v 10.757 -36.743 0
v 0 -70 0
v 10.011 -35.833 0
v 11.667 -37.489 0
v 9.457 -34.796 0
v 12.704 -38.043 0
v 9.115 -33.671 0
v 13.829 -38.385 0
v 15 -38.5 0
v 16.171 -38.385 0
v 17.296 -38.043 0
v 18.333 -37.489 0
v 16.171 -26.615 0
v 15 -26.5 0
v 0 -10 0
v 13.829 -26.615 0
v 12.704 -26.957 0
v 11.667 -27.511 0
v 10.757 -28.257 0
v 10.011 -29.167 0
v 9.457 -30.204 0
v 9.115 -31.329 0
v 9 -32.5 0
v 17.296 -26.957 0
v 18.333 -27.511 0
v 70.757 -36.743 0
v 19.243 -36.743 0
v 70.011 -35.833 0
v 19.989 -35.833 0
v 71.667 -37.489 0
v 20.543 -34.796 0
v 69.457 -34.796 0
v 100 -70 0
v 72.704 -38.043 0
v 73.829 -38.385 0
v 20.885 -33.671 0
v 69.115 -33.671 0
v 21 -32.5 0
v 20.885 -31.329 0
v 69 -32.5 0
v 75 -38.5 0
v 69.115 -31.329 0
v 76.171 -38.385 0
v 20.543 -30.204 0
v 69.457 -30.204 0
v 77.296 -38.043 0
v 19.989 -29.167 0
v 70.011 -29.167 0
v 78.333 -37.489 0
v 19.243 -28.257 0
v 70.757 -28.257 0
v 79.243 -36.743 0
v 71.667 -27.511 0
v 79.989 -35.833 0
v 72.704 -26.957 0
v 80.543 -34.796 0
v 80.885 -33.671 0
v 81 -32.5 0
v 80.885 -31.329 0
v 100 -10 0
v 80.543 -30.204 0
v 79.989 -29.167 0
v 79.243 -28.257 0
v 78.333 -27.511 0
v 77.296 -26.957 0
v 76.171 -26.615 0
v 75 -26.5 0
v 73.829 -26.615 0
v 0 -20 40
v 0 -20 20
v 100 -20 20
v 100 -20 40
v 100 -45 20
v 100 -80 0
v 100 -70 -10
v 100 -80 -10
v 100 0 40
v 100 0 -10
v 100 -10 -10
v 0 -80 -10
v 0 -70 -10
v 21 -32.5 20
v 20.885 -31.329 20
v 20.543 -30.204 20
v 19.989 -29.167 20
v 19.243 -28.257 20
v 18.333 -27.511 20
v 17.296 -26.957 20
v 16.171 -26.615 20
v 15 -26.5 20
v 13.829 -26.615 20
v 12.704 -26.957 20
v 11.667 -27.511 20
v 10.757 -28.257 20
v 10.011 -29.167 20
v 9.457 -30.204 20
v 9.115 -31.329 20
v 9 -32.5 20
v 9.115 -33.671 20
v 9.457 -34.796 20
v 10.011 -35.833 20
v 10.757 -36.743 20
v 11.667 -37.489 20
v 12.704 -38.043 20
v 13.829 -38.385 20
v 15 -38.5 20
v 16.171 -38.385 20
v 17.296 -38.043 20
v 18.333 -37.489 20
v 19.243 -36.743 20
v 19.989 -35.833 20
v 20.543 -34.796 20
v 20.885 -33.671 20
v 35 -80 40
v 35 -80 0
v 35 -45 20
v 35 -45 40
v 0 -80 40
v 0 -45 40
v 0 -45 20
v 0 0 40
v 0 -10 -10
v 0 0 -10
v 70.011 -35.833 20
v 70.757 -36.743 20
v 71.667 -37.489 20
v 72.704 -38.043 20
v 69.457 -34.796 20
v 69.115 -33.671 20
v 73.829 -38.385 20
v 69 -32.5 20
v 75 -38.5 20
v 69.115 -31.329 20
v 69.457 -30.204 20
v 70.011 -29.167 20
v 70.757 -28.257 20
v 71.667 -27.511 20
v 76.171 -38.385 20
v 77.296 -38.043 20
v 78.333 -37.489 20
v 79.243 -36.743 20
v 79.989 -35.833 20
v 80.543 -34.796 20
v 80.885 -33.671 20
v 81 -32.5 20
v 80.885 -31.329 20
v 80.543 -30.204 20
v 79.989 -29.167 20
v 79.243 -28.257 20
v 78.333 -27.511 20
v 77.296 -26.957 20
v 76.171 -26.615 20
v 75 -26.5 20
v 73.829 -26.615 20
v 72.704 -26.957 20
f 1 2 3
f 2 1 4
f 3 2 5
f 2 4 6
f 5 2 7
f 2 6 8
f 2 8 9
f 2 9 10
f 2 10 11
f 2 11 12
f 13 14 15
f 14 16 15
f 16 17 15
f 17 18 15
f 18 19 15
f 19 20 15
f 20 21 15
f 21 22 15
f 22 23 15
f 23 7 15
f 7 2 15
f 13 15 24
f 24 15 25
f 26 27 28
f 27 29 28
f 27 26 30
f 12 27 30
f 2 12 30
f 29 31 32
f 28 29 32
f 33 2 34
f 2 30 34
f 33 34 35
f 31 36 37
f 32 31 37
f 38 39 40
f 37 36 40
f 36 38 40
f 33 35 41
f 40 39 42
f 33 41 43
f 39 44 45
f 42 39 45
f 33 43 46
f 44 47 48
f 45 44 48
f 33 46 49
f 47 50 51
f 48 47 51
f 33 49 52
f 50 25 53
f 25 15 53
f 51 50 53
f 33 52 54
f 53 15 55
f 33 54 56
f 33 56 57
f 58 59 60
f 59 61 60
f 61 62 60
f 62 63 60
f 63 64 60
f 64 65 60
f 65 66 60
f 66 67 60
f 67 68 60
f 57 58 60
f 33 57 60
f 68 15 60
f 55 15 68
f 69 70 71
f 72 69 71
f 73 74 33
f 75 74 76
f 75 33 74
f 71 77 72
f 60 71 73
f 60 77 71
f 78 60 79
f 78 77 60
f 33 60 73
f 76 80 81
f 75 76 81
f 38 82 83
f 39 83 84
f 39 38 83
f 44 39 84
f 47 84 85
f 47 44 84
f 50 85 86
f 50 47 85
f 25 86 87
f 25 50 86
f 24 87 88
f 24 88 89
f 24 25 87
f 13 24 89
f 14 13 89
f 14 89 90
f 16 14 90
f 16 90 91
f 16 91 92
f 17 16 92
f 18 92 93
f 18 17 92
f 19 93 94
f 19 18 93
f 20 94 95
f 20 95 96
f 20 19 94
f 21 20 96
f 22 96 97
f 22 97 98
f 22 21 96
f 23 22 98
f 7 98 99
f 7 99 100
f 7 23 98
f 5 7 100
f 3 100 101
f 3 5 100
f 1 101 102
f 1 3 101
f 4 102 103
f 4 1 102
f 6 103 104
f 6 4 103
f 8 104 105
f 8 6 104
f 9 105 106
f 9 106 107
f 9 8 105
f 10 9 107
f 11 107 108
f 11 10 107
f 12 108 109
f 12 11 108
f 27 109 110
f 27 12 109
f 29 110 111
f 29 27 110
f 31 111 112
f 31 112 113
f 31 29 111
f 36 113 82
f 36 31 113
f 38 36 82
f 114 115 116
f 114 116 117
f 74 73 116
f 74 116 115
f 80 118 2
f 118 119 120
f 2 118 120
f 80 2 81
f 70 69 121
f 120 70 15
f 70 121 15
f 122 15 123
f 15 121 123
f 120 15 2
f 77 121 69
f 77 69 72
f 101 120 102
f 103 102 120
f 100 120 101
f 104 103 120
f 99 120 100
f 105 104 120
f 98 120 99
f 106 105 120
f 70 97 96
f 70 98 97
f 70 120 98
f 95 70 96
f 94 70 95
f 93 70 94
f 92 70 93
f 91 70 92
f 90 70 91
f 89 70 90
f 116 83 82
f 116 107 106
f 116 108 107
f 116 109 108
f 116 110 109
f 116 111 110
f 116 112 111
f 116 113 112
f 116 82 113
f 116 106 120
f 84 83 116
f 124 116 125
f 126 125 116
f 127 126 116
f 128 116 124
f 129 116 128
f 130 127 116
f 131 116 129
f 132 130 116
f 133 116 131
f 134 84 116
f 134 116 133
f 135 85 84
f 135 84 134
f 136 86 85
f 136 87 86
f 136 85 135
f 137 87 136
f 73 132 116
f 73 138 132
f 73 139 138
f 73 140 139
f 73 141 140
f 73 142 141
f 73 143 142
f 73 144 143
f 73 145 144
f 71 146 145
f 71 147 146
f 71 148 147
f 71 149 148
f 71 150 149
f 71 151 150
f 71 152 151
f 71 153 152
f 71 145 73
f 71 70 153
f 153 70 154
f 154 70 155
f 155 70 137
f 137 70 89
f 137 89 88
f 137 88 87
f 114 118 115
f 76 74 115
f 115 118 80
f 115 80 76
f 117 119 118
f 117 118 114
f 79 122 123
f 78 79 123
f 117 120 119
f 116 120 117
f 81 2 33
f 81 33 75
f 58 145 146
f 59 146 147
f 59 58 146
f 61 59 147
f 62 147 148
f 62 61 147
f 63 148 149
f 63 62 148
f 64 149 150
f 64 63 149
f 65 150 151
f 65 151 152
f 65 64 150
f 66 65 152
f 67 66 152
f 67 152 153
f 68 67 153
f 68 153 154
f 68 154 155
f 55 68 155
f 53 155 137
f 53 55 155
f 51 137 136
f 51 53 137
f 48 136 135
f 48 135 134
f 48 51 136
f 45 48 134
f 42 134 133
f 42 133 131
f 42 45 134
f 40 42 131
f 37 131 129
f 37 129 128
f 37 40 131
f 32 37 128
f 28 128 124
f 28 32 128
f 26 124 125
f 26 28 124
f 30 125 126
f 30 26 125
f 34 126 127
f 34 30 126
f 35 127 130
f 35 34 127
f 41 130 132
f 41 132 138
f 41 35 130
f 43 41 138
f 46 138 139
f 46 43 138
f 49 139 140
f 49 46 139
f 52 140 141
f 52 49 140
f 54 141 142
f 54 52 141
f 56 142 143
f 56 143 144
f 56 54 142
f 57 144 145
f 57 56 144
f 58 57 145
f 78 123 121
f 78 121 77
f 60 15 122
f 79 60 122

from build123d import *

# Parameters (mm, degrees)
SKETCH1_R           = 6
SKETCH1_W           = 65
SKETCH1_H           = 35
BOSS_EXTRUDE1_DEPTH = 20
SKETCH1_3_W         = 35
SKETCH1_3_H         = 35
SKETCH1_3_W_2       = 100
SKETCH1_3_H_2       = 20
BOSS_EXTRUDE2_DEPTH = 40
SKETCH3_W           = 10
SKETCH3_H           = 10
BOSS_EXTRUDE4_DEPTH = 100
CUT_EXTRUDE1_DEPTH  = 65


with BuildPart() as part:
    # Sketch1 → Boss-Extrude1 (new body)
    with BuildSketch(Plane.XY):
        Polygon((100, -20), (0, -20), (0, -45), (35, -45), (100, -45), align=None)
        with Locations((15, -32.5)):
            Circle(SKETCH1_R, mode=Mode.SUBTRACT)
        with Locations((75, -32.5)):
            Circle(SKETCH1_R, mode=Mode.SUBTRACT)
        with Locations((67.5, -62.5)):
            Rectangle(SKETCH1_W, SKETCH1_H)
    extrude(amount=BOSS_EXTRUDE1_DEPTH)

    # Sketch1<3> → Boss-Extrude2 (add)
    with BuildSketch(Plane.XY):
        with Locations((17.5, -62.5)):
            Rectangle(SKETCH1_3_W, SKETCH1_3_H)
        with Locations((50, -10)):
            Rectangle(SKETCH1_3_W_2, SKETCH1_3_H_2)
    extrude(amount=BOSS_EXTRUDE2_DEPTH)

    # Sketch3 → Boss-Extrude4 (add)
    with BuildSketch(Plane(origin=(0, 0, 0), x_dir=(0, 0, -1), z_dir=(1, 0, 0))):
        with Locations((5, -75)):
            Rectangle(SKETCH3_W, SKETCH3_H)
        with Locations((5, -5)):
            Rectangle(SKETCH3_W, SKETCH3_H)
    extrude(amount=BOSS_EXTRUDE4_DEPTH)

    # Sketch4 → Cut-Extrude1 (cut)
    with BuildSketch(Plane(origin=(100, 0, 0), x_dir=(0, 0, -1), z_dir=(1, 0, 0))):
        Polygon((-20, -45), (0, -80), (-20, -80), align=None)
    extrude(amount=-CUT_EXTRUDE1_DEPTH, mode=Mode.SUBTRACT)


solid = part.part
